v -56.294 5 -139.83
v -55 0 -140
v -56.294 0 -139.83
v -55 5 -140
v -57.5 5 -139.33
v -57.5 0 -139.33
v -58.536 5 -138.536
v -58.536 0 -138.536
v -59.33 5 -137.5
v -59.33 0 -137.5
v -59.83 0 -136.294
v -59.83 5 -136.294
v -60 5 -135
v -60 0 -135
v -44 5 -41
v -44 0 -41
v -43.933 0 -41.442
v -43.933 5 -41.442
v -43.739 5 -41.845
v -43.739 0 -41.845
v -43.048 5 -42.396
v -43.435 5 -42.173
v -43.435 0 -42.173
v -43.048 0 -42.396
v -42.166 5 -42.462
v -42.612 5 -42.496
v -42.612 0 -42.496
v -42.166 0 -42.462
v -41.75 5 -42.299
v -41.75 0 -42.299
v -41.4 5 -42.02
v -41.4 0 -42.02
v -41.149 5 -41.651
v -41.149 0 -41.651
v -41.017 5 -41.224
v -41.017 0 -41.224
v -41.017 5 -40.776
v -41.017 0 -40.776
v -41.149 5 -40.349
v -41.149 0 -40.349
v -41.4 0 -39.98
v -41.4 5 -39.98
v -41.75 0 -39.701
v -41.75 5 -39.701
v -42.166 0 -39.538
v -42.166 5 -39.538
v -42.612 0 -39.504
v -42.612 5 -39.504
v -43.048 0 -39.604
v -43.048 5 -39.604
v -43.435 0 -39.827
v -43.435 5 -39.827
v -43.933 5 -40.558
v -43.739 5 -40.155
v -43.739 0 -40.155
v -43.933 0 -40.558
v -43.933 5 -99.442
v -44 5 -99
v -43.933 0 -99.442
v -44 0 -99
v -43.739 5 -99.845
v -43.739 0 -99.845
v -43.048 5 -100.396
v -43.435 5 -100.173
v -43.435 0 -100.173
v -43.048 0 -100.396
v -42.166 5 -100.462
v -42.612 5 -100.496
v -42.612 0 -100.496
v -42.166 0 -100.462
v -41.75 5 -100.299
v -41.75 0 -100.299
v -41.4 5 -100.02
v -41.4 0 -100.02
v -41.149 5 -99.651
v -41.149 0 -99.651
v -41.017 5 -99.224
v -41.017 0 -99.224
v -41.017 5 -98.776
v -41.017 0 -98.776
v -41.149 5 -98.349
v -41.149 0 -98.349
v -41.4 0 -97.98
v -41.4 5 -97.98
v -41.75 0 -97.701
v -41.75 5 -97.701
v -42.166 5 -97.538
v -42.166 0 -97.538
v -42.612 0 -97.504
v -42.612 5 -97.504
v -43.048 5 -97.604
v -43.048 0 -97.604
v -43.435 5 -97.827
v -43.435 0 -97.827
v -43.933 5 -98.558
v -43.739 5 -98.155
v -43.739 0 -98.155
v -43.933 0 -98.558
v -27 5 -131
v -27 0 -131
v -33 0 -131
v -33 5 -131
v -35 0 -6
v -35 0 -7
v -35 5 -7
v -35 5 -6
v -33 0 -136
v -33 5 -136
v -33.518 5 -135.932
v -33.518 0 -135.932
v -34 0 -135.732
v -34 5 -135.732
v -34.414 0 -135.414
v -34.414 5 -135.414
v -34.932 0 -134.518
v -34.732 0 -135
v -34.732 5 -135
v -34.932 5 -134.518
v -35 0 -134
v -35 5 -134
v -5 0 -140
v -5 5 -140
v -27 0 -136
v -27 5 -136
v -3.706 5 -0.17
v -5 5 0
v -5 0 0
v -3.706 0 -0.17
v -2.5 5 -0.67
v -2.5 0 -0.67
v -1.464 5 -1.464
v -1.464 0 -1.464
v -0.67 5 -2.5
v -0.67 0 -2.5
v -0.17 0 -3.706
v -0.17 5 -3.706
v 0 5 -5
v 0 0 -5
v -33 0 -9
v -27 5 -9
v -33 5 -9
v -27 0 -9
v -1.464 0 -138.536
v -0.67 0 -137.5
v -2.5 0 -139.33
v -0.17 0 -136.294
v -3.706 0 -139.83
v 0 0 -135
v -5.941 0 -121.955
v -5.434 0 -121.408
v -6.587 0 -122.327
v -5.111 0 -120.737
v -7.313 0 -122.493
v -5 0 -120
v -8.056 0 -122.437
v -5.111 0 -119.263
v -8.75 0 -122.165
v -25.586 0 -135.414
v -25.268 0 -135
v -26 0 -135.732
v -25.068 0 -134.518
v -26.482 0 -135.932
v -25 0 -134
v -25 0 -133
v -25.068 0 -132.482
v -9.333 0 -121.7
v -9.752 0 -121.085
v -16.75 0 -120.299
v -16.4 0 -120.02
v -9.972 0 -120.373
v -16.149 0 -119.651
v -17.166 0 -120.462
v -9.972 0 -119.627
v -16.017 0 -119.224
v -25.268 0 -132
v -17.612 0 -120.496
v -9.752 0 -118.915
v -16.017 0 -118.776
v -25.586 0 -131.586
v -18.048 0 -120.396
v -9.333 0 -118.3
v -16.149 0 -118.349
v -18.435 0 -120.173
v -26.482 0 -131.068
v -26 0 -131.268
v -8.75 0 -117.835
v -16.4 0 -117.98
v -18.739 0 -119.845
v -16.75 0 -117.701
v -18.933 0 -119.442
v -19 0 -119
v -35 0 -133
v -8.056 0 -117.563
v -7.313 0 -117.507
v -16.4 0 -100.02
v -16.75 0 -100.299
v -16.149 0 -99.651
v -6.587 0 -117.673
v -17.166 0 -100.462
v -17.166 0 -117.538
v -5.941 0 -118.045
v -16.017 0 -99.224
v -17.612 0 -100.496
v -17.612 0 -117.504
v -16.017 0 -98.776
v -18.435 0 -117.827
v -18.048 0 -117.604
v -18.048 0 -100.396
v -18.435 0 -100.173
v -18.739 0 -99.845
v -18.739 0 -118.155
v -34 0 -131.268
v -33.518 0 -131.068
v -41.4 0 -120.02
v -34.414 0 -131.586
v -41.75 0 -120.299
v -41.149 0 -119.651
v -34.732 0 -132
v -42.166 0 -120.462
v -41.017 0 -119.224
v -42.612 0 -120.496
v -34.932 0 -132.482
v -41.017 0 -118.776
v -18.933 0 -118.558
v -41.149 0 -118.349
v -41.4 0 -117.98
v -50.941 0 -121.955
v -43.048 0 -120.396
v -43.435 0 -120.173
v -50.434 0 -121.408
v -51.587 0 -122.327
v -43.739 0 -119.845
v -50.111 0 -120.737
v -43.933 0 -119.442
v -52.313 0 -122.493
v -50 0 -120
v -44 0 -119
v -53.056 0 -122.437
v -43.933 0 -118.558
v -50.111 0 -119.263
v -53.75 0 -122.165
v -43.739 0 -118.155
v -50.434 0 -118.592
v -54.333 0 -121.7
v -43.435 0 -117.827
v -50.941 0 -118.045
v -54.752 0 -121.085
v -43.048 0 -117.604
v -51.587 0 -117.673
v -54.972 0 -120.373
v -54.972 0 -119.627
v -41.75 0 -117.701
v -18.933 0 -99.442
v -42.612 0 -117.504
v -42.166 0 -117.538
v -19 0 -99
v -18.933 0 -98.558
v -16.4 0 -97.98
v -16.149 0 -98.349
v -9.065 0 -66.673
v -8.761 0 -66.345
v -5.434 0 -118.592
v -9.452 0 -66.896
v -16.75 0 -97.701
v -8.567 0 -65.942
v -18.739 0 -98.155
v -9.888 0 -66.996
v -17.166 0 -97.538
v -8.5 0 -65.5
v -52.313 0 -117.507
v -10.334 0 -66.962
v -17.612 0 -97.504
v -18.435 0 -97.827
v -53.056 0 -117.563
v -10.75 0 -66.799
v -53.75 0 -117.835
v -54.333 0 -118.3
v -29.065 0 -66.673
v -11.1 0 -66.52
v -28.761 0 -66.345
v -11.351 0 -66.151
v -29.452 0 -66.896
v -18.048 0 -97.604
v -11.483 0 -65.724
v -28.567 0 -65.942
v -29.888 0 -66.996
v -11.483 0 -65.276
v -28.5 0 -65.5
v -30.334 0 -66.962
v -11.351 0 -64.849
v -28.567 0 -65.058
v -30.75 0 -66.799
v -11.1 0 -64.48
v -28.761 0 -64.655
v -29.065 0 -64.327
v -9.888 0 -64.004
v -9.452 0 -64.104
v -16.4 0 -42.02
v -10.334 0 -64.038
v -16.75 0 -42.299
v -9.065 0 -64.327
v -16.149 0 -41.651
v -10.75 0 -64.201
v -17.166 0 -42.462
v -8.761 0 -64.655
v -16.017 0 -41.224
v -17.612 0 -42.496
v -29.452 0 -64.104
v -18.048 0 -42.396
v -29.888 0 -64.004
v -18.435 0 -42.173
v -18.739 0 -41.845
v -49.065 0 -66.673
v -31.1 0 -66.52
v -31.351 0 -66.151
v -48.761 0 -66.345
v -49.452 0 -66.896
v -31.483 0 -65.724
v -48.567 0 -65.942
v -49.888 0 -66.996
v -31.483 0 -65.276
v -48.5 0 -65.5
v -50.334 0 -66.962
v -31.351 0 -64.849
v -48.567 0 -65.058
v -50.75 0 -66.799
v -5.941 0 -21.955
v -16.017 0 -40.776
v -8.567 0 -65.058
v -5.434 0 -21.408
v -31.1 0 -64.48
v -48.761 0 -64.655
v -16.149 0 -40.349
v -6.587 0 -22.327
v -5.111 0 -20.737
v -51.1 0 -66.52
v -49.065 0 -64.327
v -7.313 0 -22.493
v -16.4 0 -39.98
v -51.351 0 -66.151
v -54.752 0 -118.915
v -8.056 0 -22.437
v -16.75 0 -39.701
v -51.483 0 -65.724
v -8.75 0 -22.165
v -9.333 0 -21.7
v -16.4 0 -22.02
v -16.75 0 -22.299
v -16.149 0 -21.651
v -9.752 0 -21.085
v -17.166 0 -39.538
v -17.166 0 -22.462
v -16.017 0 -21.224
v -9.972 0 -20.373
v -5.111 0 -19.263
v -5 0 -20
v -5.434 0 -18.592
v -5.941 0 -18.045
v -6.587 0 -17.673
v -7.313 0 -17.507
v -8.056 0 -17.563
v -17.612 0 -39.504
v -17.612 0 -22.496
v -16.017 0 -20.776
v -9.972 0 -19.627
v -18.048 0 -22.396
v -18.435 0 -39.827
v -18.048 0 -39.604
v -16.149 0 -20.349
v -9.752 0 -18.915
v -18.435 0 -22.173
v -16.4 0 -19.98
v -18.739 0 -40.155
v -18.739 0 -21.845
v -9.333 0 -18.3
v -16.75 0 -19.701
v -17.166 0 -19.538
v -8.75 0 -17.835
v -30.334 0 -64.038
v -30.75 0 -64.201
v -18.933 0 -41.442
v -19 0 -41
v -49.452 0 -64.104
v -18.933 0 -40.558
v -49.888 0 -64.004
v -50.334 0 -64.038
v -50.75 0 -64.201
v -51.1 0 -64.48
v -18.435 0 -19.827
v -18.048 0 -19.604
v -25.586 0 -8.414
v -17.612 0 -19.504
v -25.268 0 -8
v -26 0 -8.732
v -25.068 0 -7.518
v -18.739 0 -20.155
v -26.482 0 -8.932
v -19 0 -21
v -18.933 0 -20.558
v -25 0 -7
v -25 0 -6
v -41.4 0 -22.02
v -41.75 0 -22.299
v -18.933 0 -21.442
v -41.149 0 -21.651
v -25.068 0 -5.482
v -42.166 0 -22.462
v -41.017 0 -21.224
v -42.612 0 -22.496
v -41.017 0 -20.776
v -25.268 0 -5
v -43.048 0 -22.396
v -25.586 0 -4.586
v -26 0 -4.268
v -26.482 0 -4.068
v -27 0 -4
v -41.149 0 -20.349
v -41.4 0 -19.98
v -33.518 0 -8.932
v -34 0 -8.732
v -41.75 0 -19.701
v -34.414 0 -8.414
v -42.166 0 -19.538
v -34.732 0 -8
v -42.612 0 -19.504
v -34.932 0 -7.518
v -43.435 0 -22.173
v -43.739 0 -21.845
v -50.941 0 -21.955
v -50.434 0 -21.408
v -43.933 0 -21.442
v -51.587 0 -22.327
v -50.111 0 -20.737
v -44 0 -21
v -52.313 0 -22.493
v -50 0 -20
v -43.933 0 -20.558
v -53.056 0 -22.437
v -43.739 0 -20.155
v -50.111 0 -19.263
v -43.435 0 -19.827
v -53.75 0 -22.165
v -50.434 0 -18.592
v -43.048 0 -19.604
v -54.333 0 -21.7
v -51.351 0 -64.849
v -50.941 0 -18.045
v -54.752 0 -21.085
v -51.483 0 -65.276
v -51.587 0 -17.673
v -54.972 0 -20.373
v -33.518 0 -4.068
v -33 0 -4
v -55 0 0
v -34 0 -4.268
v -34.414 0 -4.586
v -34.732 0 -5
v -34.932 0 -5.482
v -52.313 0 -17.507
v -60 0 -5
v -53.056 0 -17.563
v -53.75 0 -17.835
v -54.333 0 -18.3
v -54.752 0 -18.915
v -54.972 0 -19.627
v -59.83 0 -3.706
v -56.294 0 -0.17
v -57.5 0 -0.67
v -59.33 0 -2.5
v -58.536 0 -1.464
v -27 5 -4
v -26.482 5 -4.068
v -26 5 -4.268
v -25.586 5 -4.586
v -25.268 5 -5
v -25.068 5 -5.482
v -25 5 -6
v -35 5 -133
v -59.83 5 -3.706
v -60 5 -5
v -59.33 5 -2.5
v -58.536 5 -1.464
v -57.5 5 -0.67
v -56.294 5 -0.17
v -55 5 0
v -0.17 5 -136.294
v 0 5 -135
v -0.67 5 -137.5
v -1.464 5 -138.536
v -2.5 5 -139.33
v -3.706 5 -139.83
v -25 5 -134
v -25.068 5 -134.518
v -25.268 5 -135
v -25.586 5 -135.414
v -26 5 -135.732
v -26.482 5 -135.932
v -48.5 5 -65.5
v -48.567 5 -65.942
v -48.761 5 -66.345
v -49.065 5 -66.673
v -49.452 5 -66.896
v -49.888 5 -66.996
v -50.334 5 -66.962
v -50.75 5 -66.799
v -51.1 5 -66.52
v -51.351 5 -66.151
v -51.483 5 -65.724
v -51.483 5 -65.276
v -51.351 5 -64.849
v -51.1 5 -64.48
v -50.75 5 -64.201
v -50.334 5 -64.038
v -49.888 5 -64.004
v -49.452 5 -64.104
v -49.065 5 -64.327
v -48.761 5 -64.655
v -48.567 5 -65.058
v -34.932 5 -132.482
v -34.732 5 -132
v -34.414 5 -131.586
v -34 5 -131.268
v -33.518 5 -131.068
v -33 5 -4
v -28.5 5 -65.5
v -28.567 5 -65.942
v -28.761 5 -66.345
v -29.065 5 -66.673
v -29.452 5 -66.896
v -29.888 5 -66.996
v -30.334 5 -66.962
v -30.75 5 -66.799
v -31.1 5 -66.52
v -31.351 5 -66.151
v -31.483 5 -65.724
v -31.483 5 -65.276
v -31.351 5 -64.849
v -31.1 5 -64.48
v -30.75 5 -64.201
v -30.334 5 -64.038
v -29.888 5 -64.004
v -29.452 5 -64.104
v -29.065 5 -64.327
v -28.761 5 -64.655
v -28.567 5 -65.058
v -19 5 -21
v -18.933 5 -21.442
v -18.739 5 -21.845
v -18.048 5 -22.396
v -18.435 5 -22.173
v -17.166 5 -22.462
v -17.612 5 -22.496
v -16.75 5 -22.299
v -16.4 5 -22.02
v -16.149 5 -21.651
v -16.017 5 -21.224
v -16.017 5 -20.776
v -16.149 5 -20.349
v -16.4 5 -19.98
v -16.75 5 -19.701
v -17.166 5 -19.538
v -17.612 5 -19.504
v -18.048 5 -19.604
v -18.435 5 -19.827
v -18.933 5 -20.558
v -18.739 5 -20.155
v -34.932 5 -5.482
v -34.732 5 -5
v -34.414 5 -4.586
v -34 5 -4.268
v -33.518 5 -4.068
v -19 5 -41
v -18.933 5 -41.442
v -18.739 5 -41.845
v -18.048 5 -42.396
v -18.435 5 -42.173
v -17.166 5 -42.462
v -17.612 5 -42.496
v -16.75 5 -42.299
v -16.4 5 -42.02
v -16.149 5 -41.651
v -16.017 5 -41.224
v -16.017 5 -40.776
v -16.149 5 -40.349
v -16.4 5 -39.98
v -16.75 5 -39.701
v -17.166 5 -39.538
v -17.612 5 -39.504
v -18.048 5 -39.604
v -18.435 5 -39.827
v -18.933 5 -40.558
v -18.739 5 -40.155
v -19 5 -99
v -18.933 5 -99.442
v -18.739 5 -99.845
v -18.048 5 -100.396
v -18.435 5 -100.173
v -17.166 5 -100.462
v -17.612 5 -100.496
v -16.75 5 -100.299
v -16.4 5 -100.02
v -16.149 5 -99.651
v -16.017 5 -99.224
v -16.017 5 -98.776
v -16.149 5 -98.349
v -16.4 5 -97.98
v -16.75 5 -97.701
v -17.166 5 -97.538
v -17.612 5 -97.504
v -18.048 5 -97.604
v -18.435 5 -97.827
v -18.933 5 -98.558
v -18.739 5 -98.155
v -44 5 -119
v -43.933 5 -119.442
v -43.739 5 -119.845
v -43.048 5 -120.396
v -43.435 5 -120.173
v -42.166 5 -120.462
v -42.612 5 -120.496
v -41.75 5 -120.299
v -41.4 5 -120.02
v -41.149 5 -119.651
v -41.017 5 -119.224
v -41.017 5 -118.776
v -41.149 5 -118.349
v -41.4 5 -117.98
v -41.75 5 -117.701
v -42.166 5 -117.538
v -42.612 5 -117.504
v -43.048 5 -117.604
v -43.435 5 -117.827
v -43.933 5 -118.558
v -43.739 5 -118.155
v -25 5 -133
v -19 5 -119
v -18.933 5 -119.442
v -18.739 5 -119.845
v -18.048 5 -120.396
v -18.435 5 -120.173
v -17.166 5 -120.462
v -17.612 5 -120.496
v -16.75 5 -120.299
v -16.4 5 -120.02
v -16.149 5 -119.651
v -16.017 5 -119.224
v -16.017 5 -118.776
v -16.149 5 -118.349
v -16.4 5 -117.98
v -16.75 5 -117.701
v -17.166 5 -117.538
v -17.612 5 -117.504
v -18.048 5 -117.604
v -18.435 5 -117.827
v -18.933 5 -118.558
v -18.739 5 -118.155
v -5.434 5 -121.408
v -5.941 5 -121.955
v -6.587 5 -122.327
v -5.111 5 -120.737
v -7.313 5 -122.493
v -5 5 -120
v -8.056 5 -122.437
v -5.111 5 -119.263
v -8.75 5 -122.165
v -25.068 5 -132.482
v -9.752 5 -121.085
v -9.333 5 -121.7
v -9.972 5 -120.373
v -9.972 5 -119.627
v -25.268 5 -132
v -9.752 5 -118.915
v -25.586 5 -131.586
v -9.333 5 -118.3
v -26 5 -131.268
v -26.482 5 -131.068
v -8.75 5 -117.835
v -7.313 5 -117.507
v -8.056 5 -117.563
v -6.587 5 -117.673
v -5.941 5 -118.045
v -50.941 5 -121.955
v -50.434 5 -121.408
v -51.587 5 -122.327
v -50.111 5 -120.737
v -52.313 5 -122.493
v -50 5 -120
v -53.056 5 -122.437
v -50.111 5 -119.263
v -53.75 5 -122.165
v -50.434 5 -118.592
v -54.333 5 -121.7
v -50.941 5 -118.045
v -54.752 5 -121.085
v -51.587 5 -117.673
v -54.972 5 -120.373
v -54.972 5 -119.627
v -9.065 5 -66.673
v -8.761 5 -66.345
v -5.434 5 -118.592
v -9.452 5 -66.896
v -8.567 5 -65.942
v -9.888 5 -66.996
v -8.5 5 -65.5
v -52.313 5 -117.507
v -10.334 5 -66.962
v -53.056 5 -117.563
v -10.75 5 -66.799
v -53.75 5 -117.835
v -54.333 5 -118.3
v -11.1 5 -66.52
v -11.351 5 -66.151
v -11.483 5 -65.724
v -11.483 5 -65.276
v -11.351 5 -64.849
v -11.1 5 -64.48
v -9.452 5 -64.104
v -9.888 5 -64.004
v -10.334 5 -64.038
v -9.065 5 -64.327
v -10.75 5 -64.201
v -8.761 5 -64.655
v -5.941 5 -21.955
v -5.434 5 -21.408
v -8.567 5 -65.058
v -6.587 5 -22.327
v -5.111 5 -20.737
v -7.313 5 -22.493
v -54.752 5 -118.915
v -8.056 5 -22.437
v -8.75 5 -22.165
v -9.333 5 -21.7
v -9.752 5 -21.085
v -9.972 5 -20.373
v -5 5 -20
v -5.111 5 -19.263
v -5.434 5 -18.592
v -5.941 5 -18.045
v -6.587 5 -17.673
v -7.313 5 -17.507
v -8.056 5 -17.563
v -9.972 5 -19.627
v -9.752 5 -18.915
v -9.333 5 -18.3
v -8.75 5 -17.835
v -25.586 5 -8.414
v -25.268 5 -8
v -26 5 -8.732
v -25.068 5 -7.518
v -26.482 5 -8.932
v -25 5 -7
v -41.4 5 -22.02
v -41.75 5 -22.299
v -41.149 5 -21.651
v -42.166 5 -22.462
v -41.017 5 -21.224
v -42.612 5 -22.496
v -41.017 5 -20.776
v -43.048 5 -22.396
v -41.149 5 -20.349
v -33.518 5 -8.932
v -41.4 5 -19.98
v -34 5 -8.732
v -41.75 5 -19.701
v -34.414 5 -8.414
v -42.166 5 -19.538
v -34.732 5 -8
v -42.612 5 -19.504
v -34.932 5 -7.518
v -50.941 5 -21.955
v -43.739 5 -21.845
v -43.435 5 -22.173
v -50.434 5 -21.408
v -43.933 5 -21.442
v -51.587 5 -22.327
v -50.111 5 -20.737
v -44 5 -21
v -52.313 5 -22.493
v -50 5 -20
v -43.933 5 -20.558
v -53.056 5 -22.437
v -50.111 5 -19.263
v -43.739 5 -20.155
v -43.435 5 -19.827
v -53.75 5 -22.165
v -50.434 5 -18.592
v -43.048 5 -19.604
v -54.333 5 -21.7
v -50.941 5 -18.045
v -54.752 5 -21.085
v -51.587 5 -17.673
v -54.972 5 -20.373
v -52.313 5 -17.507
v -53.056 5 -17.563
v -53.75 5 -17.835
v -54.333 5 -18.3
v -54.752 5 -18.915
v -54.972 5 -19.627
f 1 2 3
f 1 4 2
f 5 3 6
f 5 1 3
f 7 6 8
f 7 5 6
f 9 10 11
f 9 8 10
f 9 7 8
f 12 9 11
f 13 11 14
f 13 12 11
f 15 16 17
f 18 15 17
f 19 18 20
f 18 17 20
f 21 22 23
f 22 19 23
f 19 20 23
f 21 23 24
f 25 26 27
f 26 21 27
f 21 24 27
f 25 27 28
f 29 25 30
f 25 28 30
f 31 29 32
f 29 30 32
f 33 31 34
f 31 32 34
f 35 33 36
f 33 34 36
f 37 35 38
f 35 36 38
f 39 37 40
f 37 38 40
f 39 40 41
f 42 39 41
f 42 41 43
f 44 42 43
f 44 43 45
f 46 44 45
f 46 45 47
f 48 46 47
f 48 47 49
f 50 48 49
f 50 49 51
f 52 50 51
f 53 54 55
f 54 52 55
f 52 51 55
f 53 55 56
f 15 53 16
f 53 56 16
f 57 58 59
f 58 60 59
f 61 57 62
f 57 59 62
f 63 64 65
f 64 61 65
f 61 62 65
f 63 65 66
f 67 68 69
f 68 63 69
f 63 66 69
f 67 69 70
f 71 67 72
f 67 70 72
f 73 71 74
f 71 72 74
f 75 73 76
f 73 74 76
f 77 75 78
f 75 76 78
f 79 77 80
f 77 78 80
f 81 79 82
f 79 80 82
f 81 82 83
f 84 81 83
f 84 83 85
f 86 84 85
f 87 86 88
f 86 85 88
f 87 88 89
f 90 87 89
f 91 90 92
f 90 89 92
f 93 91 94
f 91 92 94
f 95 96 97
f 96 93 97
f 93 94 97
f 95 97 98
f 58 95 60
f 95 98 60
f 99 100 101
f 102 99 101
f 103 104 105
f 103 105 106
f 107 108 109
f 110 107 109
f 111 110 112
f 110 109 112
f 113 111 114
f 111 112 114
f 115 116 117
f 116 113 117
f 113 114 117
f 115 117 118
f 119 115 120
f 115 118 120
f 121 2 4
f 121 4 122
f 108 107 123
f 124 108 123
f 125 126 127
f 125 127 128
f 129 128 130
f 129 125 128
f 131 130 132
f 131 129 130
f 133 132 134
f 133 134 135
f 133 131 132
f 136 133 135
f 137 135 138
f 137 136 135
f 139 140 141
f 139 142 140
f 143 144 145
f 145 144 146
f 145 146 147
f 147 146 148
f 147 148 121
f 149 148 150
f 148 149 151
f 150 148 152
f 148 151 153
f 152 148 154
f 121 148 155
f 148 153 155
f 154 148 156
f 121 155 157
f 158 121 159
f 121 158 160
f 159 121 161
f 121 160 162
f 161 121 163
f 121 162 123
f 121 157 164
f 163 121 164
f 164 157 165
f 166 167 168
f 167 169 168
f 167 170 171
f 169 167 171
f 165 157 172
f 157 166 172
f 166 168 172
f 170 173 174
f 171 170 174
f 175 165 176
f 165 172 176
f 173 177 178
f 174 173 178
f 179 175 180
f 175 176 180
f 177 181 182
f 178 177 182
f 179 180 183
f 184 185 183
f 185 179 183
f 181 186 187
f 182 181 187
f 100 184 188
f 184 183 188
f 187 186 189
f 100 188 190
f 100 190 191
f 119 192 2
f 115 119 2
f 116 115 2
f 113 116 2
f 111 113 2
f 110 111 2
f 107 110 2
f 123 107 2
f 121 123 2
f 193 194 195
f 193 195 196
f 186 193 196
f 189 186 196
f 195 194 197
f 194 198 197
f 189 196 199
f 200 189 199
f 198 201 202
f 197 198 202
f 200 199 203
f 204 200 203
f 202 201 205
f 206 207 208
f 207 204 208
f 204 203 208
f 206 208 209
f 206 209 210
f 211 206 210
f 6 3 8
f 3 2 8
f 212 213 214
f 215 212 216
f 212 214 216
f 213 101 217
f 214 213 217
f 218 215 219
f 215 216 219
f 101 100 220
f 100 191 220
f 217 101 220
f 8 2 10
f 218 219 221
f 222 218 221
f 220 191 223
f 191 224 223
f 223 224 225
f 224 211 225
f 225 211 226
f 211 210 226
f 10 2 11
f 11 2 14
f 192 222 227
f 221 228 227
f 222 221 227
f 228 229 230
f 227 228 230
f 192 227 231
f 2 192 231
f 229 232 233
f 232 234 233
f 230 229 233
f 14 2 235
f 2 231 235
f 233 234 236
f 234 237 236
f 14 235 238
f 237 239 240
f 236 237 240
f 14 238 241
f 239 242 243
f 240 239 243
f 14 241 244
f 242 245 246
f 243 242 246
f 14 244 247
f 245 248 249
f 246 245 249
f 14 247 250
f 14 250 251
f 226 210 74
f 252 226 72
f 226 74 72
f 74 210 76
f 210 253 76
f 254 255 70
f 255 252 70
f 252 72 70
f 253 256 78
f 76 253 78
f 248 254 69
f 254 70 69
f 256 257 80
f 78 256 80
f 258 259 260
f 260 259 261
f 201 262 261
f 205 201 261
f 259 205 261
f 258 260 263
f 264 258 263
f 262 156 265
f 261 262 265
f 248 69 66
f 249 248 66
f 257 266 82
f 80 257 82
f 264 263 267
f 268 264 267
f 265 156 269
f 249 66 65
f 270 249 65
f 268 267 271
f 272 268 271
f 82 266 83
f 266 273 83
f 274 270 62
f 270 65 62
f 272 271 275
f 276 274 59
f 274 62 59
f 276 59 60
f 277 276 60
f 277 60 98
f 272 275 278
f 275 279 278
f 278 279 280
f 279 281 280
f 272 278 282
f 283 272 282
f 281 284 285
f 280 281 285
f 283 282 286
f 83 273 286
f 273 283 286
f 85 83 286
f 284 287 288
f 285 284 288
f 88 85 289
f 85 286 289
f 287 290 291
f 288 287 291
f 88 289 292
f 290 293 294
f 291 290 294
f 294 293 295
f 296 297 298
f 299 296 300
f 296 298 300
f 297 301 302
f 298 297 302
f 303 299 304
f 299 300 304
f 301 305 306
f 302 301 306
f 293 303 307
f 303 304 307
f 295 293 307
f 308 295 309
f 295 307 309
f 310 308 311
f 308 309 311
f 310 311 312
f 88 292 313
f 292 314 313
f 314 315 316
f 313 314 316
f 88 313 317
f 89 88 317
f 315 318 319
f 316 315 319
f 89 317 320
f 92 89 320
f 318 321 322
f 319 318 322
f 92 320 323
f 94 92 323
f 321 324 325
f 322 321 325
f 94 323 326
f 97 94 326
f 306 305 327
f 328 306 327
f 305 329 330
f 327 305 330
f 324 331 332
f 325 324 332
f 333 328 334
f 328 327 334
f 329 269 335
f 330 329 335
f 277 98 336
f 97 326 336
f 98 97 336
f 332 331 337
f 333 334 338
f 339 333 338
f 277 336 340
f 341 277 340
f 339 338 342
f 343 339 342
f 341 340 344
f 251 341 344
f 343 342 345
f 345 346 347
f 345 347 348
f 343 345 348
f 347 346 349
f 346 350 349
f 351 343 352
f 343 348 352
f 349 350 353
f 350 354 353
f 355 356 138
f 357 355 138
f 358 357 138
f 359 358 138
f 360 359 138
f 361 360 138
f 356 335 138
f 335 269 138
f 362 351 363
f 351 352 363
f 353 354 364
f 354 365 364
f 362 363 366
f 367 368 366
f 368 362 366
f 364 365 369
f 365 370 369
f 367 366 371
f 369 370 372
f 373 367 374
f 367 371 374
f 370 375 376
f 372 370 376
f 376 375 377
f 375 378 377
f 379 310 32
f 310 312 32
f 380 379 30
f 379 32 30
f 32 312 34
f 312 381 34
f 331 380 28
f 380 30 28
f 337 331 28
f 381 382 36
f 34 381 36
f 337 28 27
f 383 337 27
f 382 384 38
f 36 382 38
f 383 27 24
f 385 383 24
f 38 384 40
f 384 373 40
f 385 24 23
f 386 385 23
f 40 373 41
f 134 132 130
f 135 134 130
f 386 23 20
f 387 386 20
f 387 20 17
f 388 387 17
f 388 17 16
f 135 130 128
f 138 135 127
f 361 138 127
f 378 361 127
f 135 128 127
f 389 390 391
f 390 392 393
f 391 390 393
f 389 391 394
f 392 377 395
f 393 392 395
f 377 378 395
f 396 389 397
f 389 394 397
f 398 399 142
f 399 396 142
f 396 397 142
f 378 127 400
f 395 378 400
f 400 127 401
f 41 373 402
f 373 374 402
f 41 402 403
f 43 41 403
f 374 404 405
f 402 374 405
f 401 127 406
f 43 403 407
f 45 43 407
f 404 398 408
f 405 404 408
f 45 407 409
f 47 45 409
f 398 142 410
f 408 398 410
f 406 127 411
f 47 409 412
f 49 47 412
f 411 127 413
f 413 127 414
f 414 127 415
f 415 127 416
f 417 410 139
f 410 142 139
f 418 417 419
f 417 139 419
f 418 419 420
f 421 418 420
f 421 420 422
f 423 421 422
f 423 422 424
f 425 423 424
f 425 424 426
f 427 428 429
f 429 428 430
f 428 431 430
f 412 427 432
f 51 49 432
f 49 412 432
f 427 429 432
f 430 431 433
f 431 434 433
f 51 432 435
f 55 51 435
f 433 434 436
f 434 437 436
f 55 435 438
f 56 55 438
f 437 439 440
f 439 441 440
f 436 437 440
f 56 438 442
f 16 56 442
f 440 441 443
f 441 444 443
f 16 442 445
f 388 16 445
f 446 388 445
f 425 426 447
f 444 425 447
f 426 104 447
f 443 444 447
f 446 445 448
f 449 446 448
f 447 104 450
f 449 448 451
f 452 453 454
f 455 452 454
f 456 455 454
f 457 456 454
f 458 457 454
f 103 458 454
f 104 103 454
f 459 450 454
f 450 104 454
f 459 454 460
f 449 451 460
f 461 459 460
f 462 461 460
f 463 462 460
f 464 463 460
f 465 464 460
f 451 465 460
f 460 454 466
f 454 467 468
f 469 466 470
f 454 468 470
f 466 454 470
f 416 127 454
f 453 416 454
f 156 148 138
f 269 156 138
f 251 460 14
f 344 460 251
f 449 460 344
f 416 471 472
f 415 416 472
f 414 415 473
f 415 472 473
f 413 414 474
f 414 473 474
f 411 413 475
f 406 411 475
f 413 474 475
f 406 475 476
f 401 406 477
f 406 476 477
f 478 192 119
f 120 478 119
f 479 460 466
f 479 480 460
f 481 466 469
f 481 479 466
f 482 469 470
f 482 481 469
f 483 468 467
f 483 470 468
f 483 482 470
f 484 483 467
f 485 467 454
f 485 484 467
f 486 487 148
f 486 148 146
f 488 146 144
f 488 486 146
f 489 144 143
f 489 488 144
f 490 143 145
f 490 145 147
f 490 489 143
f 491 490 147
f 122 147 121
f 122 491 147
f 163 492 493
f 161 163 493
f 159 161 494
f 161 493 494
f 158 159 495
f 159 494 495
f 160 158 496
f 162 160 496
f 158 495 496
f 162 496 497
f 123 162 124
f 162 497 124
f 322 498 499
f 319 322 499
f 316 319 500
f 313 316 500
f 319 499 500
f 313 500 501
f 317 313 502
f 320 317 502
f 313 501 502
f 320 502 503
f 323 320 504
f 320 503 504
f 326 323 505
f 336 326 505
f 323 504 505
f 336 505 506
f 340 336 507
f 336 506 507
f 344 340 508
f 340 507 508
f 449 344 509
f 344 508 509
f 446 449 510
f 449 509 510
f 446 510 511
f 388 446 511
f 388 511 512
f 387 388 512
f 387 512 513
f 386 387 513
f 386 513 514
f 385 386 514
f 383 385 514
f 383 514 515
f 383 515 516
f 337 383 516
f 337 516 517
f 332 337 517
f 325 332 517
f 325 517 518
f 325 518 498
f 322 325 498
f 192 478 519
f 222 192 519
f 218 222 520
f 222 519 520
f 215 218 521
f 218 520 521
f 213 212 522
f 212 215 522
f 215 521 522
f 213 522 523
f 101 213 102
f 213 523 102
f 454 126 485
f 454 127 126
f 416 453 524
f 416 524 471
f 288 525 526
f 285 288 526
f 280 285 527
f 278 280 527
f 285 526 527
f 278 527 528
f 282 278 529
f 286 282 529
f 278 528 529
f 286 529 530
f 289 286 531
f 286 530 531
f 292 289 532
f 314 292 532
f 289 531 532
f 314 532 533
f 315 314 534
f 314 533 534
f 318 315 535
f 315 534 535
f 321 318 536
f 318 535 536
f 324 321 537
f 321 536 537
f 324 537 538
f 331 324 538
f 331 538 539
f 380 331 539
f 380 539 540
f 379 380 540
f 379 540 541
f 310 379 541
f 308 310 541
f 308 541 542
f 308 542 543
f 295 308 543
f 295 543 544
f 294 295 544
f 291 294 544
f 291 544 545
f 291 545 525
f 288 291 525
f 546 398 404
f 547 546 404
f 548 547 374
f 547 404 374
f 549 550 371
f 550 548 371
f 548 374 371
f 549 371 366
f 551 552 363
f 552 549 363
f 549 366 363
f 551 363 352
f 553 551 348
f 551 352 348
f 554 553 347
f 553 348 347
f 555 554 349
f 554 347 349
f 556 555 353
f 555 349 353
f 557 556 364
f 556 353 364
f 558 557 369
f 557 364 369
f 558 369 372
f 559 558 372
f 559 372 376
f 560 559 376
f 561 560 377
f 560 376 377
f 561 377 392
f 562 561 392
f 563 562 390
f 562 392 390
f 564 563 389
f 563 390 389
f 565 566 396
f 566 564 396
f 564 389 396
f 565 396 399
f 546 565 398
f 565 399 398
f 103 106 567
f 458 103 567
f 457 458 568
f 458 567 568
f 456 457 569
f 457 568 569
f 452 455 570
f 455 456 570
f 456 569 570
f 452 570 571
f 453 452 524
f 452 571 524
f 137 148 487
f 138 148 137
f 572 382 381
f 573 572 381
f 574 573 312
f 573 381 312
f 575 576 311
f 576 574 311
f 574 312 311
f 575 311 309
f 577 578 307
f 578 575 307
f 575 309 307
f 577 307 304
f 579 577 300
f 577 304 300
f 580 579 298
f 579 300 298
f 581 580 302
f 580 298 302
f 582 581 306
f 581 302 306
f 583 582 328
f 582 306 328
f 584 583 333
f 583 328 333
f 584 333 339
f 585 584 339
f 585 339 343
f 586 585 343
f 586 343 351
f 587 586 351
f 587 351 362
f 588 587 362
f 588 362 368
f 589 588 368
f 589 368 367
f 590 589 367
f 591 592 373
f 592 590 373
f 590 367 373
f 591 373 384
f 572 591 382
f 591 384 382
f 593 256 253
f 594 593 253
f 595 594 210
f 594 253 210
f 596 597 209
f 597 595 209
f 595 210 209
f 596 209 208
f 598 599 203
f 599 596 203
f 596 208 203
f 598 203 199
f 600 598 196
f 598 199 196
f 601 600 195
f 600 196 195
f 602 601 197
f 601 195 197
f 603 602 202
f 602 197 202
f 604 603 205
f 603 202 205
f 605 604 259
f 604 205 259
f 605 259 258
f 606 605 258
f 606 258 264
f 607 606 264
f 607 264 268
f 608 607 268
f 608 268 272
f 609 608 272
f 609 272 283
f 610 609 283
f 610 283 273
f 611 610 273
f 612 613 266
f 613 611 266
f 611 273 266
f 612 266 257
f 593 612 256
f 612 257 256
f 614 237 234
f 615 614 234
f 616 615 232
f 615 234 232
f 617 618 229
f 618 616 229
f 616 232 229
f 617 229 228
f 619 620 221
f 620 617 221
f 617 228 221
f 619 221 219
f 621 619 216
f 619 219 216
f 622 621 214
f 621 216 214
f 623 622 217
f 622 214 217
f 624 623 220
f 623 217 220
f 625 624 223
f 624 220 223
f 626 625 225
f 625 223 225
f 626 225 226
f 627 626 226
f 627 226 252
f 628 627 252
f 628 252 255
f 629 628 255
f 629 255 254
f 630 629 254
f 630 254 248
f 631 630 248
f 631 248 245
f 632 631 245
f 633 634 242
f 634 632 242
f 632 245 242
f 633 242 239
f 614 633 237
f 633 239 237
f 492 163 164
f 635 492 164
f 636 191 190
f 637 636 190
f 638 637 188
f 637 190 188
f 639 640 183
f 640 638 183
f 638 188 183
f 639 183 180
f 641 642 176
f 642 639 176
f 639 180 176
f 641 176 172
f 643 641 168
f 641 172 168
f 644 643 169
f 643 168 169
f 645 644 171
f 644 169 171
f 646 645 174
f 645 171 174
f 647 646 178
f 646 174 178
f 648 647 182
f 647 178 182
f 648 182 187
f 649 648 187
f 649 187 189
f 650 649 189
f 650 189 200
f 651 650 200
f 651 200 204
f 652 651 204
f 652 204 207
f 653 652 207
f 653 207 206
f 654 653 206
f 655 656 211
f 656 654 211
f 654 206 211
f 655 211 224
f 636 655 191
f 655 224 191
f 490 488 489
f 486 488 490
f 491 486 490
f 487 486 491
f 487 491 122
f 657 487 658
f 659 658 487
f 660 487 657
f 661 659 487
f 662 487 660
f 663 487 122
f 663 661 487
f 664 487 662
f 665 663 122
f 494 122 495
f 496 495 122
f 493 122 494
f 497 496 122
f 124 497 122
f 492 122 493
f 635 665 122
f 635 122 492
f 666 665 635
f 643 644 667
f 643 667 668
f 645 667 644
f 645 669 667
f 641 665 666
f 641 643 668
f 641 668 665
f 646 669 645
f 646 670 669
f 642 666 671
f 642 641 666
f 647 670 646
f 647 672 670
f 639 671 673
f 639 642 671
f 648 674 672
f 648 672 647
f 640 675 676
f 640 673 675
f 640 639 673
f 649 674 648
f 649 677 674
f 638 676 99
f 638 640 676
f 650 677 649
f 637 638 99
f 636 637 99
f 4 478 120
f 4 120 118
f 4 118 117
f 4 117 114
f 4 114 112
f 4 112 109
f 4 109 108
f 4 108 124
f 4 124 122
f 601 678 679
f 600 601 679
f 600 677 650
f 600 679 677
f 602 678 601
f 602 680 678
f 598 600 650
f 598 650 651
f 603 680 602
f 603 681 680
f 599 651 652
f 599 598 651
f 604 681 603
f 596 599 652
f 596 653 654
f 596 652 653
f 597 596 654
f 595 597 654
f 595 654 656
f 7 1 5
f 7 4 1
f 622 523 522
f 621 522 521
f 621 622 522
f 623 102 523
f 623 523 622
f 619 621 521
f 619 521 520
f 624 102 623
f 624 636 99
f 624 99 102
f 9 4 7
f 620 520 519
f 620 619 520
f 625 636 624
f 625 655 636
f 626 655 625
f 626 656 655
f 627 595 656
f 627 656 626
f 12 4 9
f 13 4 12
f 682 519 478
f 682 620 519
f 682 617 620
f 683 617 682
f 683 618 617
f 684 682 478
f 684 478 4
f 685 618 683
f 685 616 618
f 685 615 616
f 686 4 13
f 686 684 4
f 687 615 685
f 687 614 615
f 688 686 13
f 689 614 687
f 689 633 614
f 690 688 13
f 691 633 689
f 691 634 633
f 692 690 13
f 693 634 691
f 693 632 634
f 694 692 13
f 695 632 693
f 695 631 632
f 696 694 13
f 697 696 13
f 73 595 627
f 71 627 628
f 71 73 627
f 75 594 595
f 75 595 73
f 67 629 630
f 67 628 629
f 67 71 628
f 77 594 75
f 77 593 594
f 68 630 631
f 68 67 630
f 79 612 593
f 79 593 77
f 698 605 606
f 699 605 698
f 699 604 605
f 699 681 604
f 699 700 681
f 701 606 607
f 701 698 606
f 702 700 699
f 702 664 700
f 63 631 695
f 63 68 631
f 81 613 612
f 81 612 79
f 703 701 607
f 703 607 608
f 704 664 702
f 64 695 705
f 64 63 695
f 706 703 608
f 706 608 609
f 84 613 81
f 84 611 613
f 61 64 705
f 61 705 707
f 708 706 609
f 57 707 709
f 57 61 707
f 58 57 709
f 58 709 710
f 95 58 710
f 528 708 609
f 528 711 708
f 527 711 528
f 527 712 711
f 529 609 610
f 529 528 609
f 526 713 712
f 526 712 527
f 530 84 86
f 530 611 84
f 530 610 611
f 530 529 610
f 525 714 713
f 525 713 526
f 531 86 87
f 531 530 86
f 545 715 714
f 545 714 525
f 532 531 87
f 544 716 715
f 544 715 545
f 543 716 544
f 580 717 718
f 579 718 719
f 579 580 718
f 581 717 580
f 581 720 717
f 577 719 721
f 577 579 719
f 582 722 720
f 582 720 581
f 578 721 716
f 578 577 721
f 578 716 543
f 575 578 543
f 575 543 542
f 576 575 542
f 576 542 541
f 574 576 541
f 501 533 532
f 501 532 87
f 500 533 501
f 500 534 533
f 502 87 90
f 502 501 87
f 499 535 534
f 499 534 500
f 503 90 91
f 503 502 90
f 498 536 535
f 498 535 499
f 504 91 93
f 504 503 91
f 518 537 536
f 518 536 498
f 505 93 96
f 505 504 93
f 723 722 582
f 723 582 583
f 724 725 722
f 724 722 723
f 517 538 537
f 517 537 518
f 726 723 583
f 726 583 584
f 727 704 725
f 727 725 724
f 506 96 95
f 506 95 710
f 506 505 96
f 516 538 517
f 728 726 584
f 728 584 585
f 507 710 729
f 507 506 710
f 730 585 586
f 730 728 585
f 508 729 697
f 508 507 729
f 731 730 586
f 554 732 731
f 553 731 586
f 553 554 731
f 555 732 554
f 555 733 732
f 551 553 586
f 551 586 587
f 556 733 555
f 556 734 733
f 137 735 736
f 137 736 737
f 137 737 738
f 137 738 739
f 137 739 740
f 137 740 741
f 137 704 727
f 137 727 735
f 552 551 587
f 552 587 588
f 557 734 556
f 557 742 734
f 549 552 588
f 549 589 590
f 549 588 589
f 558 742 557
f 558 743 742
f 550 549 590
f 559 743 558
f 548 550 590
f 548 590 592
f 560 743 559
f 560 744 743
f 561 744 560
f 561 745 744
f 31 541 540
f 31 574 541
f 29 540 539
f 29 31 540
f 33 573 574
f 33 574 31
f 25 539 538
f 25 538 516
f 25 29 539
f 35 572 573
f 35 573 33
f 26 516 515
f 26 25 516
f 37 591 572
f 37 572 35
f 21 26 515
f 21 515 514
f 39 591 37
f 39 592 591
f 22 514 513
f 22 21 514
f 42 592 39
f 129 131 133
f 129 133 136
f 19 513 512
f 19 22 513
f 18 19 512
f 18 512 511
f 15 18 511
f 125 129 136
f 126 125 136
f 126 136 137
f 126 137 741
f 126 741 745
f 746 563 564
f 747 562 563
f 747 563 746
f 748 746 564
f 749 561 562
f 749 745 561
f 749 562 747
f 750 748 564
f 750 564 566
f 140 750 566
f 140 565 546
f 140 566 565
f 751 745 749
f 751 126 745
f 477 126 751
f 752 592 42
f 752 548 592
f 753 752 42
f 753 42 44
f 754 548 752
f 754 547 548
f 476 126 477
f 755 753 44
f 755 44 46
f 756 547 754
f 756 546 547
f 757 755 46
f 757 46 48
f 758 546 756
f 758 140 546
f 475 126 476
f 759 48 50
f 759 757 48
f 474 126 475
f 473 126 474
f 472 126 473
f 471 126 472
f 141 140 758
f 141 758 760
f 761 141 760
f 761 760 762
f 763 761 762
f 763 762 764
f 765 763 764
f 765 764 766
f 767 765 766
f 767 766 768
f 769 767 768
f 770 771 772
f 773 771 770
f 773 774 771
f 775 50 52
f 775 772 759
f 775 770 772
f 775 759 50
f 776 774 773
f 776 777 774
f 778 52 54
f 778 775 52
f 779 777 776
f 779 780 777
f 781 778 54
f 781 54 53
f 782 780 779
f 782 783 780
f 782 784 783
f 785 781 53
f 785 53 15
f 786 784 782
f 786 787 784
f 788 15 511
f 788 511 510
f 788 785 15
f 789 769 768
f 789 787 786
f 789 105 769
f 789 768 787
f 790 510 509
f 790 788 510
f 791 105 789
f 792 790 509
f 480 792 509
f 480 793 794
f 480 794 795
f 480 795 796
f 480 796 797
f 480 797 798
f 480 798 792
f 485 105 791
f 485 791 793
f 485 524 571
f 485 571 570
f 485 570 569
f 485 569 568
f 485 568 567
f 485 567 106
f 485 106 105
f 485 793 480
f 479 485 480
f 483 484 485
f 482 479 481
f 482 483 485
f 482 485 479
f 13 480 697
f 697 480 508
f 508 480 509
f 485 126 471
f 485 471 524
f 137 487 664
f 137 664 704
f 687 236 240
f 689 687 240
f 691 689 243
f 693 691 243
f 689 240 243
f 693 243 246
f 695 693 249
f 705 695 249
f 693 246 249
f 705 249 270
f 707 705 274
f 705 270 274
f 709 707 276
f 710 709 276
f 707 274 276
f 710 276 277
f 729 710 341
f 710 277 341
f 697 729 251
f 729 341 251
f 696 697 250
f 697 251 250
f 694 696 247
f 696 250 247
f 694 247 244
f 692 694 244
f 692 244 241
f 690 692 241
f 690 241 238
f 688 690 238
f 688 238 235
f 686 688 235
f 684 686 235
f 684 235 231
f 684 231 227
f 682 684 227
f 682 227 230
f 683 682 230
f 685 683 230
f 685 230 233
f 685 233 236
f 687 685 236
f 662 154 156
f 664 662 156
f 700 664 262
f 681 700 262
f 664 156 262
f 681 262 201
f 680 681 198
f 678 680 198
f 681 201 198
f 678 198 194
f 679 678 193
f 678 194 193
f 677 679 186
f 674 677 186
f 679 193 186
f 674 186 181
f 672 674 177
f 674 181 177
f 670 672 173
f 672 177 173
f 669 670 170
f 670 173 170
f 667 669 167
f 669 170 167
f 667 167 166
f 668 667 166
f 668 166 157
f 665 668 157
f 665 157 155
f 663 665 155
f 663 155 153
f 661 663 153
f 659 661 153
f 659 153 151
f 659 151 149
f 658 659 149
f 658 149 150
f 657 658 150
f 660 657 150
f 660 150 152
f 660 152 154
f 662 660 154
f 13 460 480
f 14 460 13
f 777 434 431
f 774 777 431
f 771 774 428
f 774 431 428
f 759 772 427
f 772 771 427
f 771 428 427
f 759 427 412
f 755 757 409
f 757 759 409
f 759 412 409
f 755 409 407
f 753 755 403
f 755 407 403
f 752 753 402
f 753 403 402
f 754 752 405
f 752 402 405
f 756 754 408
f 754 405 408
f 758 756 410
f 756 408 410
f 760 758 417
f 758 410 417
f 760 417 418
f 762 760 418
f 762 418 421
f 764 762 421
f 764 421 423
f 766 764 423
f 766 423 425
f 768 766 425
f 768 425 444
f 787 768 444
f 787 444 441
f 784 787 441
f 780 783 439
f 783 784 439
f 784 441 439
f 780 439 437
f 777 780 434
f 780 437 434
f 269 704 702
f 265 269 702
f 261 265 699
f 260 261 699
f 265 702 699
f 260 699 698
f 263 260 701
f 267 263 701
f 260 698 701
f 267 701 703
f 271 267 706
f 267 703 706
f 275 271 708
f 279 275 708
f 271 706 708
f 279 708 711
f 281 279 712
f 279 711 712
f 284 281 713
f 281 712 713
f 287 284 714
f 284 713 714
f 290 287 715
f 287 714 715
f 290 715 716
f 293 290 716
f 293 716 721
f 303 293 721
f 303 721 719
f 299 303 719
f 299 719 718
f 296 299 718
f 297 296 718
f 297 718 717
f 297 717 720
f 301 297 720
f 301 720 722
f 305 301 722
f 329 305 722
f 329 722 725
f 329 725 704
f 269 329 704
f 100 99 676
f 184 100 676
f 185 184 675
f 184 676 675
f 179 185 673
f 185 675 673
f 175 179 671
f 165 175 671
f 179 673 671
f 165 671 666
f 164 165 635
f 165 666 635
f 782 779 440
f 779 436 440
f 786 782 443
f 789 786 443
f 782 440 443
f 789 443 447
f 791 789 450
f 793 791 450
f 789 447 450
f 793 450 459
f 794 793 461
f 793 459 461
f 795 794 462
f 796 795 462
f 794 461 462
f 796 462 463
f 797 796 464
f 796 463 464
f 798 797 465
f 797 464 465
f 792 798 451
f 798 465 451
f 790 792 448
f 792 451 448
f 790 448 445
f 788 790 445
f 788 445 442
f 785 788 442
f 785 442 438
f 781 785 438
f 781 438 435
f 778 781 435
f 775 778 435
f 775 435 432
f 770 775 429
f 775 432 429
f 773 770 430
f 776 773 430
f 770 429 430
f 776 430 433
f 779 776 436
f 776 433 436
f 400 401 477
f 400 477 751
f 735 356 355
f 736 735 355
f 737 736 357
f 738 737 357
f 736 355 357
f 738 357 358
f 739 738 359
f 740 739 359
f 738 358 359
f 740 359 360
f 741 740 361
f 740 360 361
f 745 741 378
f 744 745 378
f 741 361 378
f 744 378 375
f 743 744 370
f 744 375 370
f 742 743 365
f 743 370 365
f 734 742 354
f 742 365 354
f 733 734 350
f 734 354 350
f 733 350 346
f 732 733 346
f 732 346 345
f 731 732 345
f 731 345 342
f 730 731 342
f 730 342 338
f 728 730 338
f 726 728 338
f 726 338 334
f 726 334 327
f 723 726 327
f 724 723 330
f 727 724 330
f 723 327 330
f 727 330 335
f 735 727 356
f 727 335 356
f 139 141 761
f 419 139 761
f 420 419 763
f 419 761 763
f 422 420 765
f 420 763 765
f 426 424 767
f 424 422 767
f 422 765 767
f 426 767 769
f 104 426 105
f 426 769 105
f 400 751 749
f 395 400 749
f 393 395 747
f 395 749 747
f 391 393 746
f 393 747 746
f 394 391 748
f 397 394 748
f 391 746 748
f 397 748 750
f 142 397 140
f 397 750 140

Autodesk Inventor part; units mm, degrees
ref_plane "YZ Plane" through (0, 0, 0) normal (1, 0, 0) x (0, 1, 0)
ref_plane "XZ Plane" through (0, 0, 0) normal (0, 1, 0) x (-1, 0, 0)
ref_plane "XY Plane" through (0, 0, 0) normal (0, 0, 1) x (1, 0, 0)
sketch "Sketch1" plane through (0, 0, 0) normal (0, 1, 0) x (-1, 0, 0)
  line L0 (0, 0) -> (60, 0)
  line L1 (60, 0) -> (60, -140)
  line L2 (60, -140) -> (0, -140)
  line L3 (0, -140) -> (0, 0)
  line L4 (30, -20.8594) -> (30, -183.1932) construction
  line L5 (42.5, -21.7206) -> (42.5, -191.0157) construction
  line L6 (17.5, -21.7206) -> (17.5, -184.1979) construction
  circle A0 centre (42.5, -21) radius 1.5
  circle A1 centre (42.5, -41) radius 1.5
  circle A2 centre (42.5, -99) radius 1.5
  circle A3 centre (42.5, -119) radius 1.5
  circle A4 centre (17.5, -99) radius 1.5
  circle A5 centre (17.5, -119) radius 1.5
  circle A6 centre (17.5, -41) radius 1.5
  circle A7 centre (17.5, -21) radius 1.5
  dimension "d0" = 140
  dimension "d1" = 60
  dimension "d2" = 30
  dimension "d3" = 12.5
  dimension "d4" = 12.5
  dimension "d5" = 3
  dimension "d6" = 3
  dimension "d7" = 3
  dimension "d8" = 3
  dimension "d9" = 3
  dimension "d10" = 3
  dimension "d11" = 3
  dimension "d12" = 3
  dimension "d13" = 20
  dimension "d14" = 20
  dimension "d15" = 20
  dimension "d16" = 20
  dimension "d17" = 21
  dimension "d18" = 21
  dimension "d19" = 21
  dimension "d20" = 21
extrude "Extrusion1" add sketch "Sketch1" along normal blind 5
sketch "Sketch2" plane through (0, 0, 0) normal (0, -1, 0) x (1, 0, 0)
  circle A0 centre (-52.5, -120) radius 2.5
  circle A1 centre (-52.5, -20) radius 2.5
  circle A2 centre (-7.5, -120) radius 2.5
  circle A3 centre (-7.5, -20) radius 2.5
  line L0 (-60, -140) -> (-60, 0) projected
  line L1 (0, -140) -> (-60, -140) projected
  line L2 (-60, 0) -> (0, 0) projected
  line L3 (0, 0) -> (0, -140) projected
  dimension "d23" = 5
  dimension "d24" = 5
  dimension "d25" = 5
  dimension "d26" = 5
  dimension "d27" = 7.5
  dimension "d28" = 20
  dimension "d29" = 7.5
  dimension "d30" = 20
  dimension "d31" = 20
  dimension "d32" = 7.5
  dimension "d33" = 20
  dimension "d34" = 7.5
extrude "Extrusion2" cut sketch "Sketch2" against normal blind 10 contours A0 | A1 | A2 | A3
sketch "Sketch3" plane through (0, 0, 0) normal (0, -1, 0) x (1, 0, 0)
  line L0 (-68.3542, -70) -> (15.9682, -70) construction
  line L1 (0, -140) -> (-60, -140) projected
  line L2 (-35, -136) -> (-25, -136)
  line L3 (-25, -136) -> (-25, -131)
  line L4 (-25, -131) -> (-35, -131)
  line L5 (-35, -131) -> (-35, -136)
  line L6 (-60, -140) -> (-60, 0) projected
  line L7 (-35, -4) -> (-25, -4)
  line L8 (-25, -4) -> (-25, -9)
  line L9 (-25, -9) -> (-35, -9)
  line L10 (-35, -9) -> (-35, -4)
  point P0 (0, 0)
  dimension "d40" = 70
  dimension "d41" = 10
  dimension "d42" = 25
  dimension "d43" = 4
  dimension "d44" = 5
extrude "Extrusion3" cut sketch "Sketch3" against normal blind 10
fillet "Fillet2" radius 5 4 edges at (0, 2.5, -140) (-60, 2.5, -140) (-60, 2.5, 0) (0, 2.5, 0)
sketch "Sketch4" plane through (0, 5, 0) normal (0, 1, 0) x (1, 0, 0)
  circle A0 centre (-10, 65.5) radius 1.5
  circle A1 centre (-30, 65.5) radius 1.5
  circle A2 centre (-50, 65.5) radius 1.5
  line L0 (3.8133, 65.5) -> (-51.9818, 65.5) construction
  line L1 (-55, 0) -> (-5, 0) projected
  line L2 (0, 5) -> (0, 135) projected
  point P0 (0, 0)
  dimension "d49" = 3
  dimension "d50" = 3
  dimension "d51" = 3
  dimension "d52" = 65.5
  dimension "d53" = 10
  dimension "d54" = 30
  dimension "d55" = 50
extrude "Extrusion4" cut sketch "Sketch4" against normal blind 10
fillet "Fillet3" radius 2 8 edges at (-25, 2.5, -131) (-25, 2.5, -136) (-35, 2.5, -136) (-35, 2.5, -131) (-25, 2.5, -9) (-25, 2.5, -4) (-35, 2.5, -4) (-35, 2.5, -9)
equation "\"d2\" = 0.5 * d1"
equation "\"d4\" = d3"
equation "\"d6\" = d5"
equation "\"d7\" = d5"
equation "\"d8\" = d5"
equation "\"d9\" = d5"
equation "\"d10\" = d5"
equation "\"d11\" = d5"
equation "\"d12\" = d5"
equation "\"d14\" = d13"
equation "\"d15\" = d13"
equation "\"d16\" = d13"
equation "\"d18\" = d17"
equation "\"d19\" = d17"
equation "\"d20\" = d17"
equation "\"d29\" = d27"
equation "\"d30\" = d28"
equation "\"d31\" = d28"
equation "\"d32\" = d27"
equation "\"d33\" = d28"
equation "\"d34\" = d27"
properties part number "Y-Axis_back_plate_bottom"
